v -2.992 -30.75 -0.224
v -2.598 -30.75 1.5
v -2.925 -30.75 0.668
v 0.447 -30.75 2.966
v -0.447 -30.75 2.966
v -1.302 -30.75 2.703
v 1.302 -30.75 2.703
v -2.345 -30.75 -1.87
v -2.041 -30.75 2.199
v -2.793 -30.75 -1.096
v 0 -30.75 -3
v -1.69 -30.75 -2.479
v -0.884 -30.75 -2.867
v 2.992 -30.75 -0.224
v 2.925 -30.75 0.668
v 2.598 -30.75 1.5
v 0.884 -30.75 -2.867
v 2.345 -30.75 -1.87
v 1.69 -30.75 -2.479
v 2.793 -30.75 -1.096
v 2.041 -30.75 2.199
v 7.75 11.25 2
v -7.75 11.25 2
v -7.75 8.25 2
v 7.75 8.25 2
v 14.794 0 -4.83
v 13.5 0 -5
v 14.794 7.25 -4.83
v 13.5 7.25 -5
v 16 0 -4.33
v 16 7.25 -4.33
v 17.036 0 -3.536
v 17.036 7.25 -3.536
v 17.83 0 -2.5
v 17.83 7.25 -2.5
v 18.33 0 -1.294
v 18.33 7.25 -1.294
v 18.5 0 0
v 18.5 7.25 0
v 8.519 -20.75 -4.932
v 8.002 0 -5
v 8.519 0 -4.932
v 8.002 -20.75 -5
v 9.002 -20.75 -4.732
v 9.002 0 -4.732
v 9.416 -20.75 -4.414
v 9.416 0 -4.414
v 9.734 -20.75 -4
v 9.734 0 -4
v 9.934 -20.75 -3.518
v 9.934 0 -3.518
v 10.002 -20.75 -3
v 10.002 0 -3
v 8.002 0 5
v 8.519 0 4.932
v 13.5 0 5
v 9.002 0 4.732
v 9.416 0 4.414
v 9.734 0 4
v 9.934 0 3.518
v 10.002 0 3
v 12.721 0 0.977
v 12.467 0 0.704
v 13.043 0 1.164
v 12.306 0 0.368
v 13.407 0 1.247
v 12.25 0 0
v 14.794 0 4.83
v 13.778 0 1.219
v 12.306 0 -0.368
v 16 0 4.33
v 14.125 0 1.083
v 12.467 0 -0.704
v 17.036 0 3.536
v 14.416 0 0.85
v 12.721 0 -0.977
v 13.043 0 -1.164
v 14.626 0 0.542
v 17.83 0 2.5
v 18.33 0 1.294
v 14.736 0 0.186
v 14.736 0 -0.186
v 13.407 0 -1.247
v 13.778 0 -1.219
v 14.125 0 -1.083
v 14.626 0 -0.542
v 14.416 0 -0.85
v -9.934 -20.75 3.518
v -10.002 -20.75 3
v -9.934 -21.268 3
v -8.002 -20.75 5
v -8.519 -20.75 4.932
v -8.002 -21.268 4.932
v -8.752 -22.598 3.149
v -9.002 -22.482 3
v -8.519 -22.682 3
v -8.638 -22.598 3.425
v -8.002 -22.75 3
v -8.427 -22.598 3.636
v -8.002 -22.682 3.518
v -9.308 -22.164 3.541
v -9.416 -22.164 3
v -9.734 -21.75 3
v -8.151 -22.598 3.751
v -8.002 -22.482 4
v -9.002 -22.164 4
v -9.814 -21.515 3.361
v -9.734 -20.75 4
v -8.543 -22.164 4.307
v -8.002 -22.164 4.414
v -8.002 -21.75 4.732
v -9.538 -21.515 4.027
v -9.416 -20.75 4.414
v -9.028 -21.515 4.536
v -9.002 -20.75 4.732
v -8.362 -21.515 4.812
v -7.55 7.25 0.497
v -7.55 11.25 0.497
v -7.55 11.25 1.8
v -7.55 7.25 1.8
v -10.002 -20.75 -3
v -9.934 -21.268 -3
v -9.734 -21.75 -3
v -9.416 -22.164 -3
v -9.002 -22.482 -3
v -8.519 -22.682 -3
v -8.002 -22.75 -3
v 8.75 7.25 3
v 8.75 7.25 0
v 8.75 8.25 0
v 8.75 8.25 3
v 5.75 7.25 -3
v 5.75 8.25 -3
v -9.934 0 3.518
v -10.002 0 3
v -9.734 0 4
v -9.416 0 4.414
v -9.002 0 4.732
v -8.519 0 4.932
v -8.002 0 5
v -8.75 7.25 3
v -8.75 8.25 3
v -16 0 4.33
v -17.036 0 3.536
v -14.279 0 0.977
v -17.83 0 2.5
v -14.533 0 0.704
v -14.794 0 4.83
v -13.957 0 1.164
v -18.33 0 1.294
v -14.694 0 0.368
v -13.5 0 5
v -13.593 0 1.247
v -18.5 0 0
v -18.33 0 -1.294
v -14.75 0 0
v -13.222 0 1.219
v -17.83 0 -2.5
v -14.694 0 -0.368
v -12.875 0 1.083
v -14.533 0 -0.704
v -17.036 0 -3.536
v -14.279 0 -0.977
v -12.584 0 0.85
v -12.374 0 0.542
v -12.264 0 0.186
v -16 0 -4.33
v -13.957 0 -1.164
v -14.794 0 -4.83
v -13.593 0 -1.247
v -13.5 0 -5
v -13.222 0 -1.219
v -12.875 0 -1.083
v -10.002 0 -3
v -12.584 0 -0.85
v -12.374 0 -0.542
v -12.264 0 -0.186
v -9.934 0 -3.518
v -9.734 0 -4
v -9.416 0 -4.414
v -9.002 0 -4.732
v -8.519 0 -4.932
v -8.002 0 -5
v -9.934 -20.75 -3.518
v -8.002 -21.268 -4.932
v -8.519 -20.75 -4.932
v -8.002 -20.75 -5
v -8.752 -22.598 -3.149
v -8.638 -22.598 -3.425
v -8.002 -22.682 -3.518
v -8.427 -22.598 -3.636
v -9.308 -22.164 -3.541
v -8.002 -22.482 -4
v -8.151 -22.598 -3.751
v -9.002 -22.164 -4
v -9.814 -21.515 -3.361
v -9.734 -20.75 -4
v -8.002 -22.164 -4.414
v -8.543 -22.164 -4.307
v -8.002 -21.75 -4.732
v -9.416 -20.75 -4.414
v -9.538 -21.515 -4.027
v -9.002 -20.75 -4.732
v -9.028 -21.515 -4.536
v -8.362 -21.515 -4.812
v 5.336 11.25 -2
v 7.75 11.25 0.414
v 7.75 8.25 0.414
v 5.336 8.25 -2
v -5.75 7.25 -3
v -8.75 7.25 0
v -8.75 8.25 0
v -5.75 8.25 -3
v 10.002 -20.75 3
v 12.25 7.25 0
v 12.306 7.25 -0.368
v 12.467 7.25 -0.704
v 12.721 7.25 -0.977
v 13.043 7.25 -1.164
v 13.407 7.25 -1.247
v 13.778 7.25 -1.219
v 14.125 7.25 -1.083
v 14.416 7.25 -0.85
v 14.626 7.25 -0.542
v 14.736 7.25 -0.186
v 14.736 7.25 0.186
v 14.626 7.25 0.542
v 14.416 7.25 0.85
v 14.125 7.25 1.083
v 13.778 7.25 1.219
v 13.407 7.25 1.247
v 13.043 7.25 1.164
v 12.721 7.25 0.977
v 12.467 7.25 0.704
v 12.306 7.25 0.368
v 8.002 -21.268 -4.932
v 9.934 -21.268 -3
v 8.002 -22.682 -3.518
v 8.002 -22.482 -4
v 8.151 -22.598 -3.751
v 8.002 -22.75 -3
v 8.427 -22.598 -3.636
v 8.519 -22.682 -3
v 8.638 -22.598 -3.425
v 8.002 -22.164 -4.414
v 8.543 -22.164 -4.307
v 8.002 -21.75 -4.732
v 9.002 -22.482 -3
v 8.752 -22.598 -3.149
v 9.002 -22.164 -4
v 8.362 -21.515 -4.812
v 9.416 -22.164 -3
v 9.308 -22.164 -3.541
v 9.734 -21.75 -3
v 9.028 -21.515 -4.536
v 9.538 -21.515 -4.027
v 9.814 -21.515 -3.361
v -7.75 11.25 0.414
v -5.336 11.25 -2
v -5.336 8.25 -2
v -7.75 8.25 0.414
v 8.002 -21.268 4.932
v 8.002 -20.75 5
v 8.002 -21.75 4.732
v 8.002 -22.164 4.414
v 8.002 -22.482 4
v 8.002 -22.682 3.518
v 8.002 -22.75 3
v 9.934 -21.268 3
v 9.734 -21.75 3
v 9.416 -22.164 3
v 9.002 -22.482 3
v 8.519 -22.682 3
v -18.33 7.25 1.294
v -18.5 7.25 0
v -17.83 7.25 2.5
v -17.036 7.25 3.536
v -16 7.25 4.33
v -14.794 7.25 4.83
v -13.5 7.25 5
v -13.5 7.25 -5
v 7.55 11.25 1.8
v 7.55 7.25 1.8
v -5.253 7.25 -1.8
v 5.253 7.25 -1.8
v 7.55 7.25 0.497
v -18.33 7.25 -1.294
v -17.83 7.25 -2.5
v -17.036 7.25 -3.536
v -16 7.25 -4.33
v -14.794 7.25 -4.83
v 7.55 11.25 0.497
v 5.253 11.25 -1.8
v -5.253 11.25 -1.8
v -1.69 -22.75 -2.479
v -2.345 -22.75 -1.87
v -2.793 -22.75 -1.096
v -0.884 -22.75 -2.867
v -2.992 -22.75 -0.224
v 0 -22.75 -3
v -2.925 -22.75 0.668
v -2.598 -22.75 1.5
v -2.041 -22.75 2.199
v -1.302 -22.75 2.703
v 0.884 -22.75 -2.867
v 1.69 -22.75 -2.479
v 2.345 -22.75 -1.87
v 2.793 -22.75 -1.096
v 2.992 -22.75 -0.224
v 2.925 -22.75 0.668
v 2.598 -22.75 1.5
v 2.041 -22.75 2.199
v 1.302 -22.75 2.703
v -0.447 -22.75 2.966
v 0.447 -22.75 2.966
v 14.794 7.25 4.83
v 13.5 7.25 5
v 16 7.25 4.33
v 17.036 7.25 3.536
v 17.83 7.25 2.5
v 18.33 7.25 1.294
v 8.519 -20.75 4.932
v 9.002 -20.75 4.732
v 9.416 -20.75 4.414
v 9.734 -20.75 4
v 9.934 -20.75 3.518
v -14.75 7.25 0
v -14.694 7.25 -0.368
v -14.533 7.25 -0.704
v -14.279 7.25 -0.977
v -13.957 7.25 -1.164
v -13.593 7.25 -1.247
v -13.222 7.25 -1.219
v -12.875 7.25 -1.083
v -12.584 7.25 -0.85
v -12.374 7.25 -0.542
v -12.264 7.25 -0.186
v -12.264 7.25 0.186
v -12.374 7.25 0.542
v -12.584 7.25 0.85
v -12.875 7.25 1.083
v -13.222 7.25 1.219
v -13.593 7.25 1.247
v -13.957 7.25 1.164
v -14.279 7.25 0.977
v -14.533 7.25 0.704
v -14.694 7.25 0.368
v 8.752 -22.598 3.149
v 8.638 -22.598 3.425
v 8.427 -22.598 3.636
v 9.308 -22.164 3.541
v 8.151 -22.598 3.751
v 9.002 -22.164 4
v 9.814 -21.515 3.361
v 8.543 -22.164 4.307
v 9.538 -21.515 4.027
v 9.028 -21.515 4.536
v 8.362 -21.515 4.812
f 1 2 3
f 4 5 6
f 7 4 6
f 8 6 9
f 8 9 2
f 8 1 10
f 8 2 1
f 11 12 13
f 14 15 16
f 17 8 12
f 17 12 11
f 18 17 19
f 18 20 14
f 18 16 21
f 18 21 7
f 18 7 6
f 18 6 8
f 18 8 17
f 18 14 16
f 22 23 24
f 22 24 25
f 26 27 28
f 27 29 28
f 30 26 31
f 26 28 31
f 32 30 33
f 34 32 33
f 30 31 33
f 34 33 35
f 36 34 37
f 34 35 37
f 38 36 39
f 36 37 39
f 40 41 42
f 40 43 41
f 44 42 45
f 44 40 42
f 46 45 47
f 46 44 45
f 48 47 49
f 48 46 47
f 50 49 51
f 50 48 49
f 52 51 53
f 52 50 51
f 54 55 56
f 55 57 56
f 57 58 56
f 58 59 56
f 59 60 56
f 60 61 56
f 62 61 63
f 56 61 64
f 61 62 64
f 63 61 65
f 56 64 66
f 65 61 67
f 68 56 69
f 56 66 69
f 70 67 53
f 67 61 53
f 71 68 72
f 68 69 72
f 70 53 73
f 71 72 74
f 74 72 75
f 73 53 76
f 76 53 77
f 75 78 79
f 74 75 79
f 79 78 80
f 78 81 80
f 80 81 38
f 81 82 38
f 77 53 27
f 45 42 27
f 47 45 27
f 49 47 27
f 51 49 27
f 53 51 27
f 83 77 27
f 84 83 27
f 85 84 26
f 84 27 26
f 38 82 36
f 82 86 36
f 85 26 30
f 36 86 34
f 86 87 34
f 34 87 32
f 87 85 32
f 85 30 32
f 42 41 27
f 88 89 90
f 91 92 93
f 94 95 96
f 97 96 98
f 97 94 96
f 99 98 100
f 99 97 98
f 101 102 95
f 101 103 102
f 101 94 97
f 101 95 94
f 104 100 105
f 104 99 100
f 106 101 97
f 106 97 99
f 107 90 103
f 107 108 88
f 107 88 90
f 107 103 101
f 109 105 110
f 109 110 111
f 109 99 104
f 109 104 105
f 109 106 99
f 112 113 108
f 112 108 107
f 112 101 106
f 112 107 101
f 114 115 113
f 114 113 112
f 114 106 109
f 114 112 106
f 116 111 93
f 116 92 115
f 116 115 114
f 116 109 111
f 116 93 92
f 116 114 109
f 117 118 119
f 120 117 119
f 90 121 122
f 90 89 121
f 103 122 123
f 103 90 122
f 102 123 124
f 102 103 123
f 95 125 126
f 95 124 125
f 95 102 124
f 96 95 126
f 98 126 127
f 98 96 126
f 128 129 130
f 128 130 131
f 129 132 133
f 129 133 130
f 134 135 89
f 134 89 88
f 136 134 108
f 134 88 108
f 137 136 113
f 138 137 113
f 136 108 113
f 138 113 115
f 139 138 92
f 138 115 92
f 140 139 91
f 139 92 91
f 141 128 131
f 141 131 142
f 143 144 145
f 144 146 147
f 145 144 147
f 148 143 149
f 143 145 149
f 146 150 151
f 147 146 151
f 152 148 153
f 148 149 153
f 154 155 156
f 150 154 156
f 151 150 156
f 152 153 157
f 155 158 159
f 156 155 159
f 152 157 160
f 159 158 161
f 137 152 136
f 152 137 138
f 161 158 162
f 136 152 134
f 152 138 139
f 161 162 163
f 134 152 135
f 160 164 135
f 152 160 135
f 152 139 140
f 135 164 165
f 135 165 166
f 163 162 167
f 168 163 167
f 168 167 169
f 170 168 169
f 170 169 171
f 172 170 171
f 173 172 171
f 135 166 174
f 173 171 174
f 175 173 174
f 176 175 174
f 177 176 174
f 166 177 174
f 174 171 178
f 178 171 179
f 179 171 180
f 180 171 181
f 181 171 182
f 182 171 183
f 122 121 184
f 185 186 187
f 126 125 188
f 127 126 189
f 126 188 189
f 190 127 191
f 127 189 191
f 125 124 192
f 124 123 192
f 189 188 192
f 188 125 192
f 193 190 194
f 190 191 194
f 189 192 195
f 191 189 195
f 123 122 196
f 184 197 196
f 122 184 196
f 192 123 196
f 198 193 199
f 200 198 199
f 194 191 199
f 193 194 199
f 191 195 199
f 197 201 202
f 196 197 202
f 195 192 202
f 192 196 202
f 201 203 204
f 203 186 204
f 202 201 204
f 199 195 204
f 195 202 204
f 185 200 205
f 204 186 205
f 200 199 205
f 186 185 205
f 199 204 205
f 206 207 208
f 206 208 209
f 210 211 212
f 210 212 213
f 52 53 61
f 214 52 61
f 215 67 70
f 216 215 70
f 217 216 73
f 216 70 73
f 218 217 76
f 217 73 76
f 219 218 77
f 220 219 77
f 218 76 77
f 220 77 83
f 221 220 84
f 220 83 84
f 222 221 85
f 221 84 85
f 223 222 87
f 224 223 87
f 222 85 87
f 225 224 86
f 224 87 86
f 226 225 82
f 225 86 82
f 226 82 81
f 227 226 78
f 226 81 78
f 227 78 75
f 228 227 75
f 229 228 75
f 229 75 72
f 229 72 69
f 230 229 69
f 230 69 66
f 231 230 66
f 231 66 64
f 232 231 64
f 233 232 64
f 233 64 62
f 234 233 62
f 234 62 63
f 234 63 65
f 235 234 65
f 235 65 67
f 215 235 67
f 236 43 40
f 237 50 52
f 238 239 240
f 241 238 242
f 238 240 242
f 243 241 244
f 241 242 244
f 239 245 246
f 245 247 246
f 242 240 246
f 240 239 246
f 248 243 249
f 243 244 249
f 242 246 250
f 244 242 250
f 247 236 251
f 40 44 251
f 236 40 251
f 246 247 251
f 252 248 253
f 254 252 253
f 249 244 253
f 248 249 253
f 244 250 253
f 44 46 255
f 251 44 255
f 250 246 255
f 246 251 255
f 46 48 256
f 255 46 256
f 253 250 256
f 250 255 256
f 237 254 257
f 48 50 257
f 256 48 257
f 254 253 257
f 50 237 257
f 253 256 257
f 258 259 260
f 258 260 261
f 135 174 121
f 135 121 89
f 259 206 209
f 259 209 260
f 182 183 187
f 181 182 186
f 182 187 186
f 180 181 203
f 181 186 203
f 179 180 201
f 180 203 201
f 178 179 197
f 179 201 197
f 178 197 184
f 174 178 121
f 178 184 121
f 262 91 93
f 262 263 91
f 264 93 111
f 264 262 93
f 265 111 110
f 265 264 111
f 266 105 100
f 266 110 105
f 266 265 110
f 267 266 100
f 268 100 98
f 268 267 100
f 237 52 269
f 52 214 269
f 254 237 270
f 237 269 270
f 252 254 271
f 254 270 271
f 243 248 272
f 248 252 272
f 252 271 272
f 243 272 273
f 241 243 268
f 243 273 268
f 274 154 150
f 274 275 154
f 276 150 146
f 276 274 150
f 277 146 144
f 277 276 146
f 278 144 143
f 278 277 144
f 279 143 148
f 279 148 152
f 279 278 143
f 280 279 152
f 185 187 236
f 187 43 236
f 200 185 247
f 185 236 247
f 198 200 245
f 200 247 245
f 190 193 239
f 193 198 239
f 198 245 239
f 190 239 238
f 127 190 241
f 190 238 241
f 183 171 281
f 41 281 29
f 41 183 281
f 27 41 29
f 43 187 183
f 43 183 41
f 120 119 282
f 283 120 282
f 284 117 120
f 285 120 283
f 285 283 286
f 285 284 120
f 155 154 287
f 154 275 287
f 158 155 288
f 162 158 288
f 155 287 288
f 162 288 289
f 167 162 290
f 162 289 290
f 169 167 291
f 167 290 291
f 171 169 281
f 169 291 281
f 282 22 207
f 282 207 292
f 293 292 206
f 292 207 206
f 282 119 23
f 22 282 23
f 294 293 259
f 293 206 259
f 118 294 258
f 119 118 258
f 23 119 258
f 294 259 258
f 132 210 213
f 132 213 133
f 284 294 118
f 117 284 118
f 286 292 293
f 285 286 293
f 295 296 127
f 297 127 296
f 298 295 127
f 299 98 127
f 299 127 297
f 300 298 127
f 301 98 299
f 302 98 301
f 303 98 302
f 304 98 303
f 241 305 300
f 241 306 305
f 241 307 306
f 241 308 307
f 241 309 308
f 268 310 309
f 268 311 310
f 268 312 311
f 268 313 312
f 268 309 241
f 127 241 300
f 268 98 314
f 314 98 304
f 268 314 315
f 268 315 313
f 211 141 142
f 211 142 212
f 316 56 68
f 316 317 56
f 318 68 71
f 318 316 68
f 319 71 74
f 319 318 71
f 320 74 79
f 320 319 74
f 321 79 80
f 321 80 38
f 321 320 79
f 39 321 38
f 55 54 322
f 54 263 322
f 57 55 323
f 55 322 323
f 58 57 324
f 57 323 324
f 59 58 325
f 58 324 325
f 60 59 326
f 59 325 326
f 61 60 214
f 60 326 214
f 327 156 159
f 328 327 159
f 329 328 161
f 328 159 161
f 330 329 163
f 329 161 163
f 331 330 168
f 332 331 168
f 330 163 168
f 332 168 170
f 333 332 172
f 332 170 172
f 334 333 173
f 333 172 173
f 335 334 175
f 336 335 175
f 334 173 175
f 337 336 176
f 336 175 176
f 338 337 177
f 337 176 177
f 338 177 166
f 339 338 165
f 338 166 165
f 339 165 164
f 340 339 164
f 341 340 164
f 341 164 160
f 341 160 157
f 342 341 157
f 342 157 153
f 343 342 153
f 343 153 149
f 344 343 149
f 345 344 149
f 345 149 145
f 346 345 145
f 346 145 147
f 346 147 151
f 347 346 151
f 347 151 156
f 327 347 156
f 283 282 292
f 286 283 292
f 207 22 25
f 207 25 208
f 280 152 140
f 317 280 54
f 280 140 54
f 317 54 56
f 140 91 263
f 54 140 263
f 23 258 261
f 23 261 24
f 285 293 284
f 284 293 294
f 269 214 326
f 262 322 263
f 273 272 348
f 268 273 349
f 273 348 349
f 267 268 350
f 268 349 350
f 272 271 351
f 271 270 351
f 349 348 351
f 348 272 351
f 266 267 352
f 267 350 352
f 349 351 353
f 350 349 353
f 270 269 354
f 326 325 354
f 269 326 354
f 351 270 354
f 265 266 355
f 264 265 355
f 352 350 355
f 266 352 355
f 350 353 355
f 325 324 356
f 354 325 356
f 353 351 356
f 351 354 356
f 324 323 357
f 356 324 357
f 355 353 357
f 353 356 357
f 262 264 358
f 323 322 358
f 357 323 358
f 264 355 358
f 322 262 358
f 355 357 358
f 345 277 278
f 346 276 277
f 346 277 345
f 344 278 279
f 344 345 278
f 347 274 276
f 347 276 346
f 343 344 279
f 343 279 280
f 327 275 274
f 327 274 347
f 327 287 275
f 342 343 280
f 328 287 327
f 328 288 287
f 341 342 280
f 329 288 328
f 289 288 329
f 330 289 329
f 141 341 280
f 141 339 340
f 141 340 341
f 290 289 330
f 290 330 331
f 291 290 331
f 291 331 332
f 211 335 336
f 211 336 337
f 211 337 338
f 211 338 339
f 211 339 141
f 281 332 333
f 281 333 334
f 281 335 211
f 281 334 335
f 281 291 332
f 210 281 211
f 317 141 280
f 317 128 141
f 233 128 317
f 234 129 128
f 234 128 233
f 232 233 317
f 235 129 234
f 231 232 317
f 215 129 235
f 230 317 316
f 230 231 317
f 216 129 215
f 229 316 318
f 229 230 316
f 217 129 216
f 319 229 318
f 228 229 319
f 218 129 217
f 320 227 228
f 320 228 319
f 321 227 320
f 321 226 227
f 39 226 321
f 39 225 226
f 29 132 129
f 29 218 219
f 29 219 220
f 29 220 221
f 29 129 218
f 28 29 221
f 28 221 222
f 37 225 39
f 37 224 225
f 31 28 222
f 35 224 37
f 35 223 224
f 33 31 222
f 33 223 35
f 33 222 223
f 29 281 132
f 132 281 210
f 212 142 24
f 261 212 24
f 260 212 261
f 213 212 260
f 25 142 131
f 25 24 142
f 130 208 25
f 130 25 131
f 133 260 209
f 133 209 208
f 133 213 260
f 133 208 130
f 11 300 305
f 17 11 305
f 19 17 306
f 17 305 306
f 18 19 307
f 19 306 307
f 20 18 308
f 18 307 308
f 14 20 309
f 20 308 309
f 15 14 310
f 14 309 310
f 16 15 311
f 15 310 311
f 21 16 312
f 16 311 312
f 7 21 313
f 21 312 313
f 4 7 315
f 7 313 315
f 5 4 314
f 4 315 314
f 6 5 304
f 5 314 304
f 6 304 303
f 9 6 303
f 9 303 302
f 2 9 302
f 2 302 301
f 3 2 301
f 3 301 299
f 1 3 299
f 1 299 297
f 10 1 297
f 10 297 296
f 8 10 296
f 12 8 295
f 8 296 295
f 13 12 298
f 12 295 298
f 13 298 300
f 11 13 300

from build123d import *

# Parameters (mm, degrees)
SKETCH_1_W          = 37
SKETCH_1_H          = 10
EXTRUDE_1_DEPTH     = 7.25
EXTRUDE_2_DEPTH     = 4
FILLET_1_R          = 5
CUT_EXTRUDE_1_DEPTH = 3
CUT_EXTRUDE_3_DEPTH = 4
HOLE_WIZARD_M3_1_D  = 2.5
SKETCH_7_W          = 20.003423604
SKETCH_7_H          = 10
EXTRUDE_3_DEPTH     = 22.75
SKETCH_8_R          = 3
EXTRUDE_4_DEPTH     = 8
FILLET_2_R          = 2


with BuildPart() as part:
    # 草图1 → 凸台-拉伸1 (new body)
    with BuildSketch(Plane(origin=(0, 0, 0), x_dir=(1, 0, 0), z_dir=(0, 1, 0))):
        Rectangle(SKETCH_1_W, SKETCH_1_H)
    extrude(amount=EXTRUDE_1_DEPTH)

    # 草图2 → 凸台-拉伸2 (add)
    with BuildSketch(Plane(origin=(0, 7.25, 0), x_dir=(1, 0, 0), z_dir=(0, 1, 0))):
        Polygon((-8.75, 0), (-5.75, 3), (5.75, 3), (8.75, 0), (8.75, -3), (-8.75, -3), align=None)
    extrude(amount=EXTRUDE_2_DEPTH)

    # 圆角1
    fillet_1_edges = [part.edges().sort_by_distance(p)[0] for p in [
        (18.5, 3.625, 5),
        (18.5, 3.625, -5),
        (-18.5, 3.625, 5),
        (-18.5, 3.625, -5),
    ]]
    fillet(fillet_1_edges, radius=FILLET_1_R - 0.0001)  # a hair under: the kernel refuses the full size

    # 草图3 → 切除-拉伸1 (cut)
    with BuildSketch(Plane(origin=(0, 11.25, 0), x_dir=(1, 0, 0), z_dir=(0, 1, 0))):
        Polygon((8.75, -3), (8.75, 0), (5.75, 3), (-5.75, 3), (-8.75, 0), (-8.75, -3), align=None)
        Polygon((7.75, -2), (7.75, -0.414213562), (5.335786438, 2), (-5.335786438, 2), (-7.75, -0.414213562), (-7.75, -2), align=None, mode=Mode.SUBTRACT)
    extrude(amount=-CUT_EXTRUDE_1_DEPTH, mode=Mode.SUBTRACT)

    # 草图4 → 切除-拉伸3 (cut)
    with BuildSketch(Plane(origin=(0, 11.25, 0), x_dir=(1, 0, 0), z_dir=(0, 1, 0))):
        Polygon((-7.55, -0.497056275), (-7.55, -1.8), (7.55, -1.8), (7.55, -0.497056275), (5.252943725, 1.8), (-5.252943725, 1.8), align=None)
    extrude(amount=-CUT_EXTRUDE_3_DEPTH, mode=Mode.SUBTRACT)

    # M3 螺纹孔1 (through all)
    with Locations(Plane(origin=(0, 7.25, 0), x_dir=(1, 0, 0), z_dir=(0, 1, 0))):
        with Locations((-13.5, 0), (13.5, 0)):
            Hole(HOLE_WIZARD_M3_1_D / 2)

    # 草图7 → 凸台-拉伸3 (add)
    with BuildSketch(Plane.XZ):
        Rectangle(SKETCH_7_W, SKETCH_7_H)
    extrude(amount=EXTRUDE_3_DEPTH)

    # 草图8 → 凸台-拉伸4 (add)
    with BuildSketch(Plane.XZ.offset(22.75)):
        with Locations(Location((0, 0, 0), (0, 0, 270))):
            Circle(SKETCH_8_R)
    extrude(amount=EXTRUDE_4_DEPTH)

    # 圆角2
    fillet_2_edges = [part.edges().sort_by_distance(p)[0] for p in [
        (-10.001711802, -11.375, 5),
        (-10.001711802, -11.375, -5),
        (10.001711802, -11.375, -5),
        (10.001711802, -11.375, 5),
        (-10.001711802, -22.75, 0),
        (0, -22.75, -5),
        (10.001711802, -22.75, 0),
        (0, -22.75, 5),
    ]]
    fillet(fillet_2_edges, radius=FILLET_2_R - 0.0001)  # a hair under: the kernel refuses the full size


solid = part.part
